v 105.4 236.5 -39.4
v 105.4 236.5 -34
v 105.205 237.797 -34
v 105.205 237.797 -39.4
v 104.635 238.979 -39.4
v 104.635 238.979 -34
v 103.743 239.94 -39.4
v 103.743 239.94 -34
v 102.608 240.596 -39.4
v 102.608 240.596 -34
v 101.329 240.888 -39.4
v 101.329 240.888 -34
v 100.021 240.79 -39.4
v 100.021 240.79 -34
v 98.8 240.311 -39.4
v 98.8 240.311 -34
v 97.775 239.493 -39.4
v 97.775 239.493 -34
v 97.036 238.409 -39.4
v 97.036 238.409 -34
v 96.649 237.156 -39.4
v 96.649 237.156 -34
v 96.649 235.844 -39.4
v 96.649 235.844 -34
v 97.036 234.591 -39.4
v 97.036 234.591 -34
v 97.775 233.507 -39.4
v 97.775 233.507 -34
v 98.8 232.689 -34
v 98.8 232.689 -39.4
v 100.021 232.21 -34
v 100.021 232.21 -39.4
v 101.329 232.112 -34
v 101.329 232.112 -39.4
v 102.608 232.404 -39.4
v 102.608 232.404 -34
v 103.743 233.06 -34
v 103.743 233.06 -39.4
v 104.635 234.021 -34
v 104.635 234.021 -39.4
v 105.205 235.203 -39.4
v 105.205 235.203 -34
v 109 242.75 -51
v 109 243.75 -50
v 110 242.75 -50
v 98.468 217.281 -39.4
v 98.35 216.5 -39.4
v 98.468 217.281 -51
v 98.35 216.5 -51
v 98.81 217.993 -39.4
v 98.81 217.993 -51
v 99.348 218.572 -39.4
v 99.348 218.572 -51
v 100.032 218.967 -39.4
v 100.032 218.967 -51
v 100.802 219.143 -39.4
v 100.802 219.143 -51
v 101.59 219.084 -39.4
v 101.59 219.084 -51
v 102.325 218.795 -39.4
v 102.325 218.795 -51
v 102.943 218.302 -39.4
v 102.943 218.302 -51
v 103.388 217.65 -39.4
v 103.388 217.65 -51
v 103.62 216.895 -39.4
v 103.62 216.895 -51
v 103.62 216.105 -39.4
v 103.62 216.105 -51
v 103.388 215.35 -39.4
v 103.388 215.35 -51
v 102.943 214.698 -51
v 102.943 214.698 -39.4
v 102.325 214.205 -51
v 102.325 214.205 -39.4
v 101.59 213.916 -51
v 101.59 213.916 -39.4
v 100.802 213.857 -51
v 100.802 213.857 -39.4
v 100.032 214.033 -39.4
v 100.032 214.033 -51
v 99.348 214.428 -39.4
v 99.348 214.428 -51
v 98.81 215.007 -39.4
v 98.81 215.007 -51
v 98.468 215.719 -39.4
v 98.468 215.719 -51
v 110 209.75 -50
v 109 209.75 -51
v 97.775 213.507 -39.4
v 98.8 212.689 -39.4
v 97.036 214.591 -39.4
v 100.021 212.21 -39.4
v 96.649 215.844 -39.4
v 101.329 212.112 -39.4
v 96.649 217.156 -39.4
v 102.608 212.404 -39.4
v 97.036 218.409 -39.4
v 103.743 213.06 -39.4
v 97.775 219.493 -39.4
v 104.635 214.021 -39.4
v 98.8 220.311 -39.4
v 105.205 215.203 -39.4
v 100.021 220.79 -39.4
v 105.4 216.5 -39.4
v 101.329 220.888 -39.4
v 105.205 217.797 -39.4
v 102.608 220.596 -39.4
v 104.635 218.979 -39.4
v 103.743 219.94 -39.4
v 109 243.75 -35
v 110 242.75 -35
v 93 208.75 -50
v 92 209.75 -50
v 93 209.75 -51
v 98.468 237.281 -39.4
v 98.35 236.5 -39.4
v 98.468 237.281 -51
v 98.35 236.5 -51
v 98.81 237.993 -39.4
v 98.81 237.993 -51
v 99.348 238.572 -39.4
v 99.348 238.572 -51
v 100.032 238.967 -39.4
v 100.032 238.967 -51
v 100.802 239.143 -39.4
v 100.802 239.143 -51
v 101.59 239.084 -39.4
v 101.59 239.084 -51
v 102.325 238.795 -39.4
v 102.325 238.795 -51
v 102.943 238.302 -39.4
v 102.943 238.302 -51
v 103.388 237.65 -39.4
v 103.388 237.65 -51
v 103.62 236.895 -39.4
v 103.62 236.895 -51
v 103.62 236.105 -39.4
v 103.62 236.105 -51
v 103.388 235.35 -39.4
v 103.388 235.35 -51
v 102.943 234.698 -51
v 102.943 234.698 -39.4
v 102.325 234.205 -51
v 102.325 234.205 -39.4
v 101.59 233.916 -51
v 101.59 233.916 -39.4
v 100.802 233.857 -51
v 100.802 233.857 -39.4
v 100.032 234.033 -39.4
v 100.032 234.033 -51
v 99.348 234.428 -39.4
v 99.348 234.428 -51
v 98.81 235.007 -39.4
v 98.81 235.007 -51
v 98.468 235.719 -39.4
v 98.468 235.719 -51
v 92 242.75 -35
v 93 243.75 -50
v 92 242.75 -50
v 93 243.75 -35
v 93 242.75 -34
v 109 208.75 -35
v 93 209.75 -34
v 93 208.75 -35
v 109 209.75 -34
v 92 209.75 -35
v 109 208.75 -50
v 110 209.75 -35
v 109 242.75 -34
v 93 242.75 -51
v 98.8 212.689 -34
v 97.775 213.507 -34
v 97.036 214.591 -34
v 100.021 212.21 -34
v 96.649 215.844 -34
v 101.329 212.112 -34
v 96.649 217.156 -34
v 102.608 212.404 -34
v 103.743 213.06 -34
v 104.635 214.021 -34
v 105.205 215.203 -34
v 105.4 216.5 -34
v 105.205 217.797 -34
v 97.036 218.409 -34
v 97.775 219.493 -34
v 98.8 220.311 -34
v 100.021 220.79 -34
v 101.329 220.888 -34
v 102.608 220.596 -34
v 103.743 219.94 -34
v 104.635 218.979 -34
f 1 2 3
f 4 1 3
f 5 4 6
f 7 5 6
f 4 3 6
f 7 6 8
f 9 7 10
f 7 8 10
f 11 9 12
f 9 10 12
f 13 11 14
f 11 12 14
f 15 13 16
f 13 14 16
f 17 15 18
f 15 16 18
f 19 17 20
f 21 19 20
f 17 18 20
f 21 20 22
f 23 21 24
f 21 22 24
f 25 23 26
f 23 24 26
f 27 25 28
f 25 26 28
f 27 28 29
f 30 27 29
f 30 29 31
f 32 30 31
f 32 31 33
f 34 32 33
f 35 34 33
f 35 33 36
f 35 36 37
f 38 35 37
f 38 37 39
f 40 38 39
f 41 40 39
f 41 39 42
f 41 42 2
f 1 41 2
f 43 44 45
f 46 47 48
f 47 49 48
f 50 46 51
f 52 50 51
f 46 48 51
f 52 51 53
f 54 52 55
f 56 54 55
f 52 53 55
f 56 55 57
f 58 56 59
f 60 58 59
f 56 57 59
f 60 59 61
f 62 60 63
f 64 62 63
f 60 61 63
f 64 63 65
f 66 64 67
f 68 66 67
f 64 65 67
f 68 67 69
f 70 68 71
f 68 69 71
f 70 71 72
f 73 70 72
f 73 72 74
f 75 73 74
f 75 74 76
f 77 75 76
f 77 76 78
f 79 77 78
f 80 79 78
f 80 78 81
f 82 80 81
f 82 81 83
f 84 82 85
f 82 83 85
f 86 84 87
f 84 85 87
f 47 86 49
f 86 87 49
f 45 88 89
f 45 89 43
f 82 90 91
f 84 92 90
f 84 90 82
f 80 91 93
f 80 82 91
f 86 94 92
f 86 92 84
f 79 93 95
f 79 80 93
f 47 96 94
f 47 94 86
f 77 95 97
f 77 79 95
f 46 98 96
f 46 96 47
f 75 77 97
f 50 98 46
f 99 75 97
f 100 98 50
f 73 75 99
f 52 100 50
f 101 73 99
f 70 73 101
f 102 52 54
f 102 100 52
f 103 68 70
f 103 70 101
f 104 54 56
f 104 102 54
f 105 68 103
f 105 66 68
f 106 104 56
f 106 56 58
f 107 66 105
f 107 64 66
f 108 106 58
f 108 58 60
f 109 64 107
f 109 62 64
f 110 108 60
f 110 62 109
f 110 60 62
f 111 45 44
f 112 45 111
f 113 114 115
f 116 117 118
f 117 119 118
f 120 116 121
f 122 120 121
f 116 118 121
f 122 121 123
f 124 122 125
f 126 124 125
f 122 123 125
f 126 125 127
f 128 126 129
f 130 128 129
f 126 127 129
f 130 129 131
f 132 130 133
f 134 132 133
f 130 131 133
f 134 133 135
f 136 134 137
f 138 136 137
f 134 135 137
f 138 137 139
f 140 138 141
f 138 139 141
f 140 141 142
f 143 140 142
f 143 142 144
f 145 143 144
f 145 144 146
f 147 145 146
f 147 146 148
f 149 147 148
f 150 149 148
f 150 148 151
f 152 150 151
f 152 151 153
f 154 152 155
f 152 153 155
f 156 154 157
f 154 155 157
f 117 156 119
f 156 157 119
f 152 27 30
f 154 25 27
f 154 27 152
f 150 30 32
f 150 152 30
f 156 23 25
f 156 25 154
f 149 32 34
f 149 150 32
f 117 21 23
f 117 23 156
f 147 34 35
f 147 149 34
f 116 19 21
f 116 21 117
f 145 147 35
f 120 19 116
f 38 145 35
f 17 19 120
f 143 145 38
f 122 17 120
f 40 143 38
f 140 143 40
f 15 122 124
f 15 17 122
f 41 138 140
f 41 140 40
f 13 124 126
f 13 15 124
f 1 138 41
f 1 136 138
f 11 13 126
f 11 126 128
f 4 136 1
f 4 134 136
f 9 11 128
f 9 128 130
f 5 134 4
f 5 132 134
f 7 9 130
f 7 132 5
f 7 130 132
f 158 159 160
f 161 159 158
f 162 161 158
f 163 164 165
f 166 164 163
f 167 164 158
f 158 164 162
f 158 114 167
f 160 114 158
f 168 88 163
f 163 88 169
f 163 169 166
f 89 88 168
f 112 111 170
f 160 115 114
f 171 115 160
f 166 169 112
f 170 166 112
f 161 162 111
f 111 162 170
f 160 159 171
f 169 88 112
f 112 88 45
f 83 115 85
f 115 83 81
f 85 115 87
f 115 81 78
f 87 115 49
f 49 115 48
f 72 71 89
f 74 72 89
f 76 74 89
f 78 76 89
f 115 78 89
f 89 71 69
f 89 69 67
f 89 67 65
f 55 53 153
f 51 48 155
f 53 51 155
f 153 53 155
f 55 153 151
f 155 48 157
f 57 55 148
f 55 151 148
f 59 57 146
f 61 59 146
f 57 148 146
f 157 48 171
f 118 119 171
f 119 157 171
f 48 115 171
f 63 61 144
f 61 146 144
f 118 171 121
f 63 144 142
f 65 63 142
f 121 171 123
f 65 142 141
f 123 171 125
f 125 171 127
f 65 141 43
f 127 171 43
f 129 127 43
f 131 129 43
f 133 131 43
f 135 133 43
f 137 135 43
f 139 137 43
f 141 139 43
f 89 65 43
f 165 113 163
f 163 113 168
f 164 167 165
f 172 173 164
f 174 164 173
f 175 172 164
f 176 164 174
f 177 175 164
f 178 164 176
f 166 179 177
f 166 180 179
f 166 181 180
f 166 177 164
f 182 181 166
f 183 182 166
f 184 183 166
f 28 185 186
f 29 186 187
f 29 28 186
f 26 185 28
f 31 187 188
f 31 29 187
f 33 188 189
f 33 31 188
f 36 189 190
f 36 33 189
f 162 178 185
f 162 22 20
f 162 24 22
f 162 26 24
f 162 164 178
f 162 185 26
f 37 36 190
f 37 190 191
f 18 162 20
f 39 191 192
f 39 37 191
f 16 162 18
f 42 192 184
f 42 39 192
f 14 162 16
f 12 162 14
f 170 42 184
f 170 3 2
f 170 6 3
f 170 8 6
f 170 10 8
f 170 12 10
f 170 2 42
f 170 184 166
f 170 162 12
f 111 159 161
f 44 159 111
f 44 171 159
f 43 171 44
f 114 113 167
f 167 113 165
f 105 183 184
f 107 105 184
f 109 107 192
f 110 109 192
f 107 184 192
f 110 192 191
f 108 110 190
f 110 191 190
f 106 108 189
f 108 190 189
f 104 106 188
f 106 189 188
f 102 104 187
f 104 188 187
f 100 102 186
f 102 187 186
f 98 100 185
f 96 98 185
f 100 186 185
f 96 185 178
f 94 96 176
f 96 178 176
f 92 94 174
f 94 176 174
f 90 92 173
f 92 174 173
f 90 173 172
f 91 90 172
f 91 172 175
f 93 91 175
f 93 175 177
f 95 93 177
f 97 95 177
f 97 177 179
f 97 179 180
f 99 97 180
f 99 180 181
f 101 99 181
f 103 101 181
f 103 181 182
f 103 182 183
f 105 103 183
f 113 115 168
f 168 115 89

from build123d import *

# Parameters (mm, degrees)
SKETCH076_W         = 18
SKETCH076_H         = 35
PAD038_DEPTH        = 17
HOLE008_D           = 5.3
HOLE008_DEPTH       = 25
HOLE008_CBORE_D     = 8.8
HOLE008_CBORE_DEPTH = 5.4
CHAMFER021_SIZE     = 1


with BuildPart() as part:
    # Sketch076 → Pad038 (new body)
    with BuildSketch(Plane.XY.offset(-51)):
        with Locations((101, 222.5)):
            Rectangle(SKETCH076_W, SKETCH076_H)
    extrude(amount=PAD038_DEPTH)

    # Hole008
    with Locations(Plane.XY.offset(-34)):
        with Locations((101, 232.75), (101, 212.75)):
            CounterBoreHole(HOLE008_D / 2, HOLE008_CBORE_D / 2, HOLE008_CBORE_DEPTH, depth=HOLE008_DEPTH)

    # Chamfer021
    chamfer021_edges = [part.edges().sort_by_distance(p)[0] for p in [
        (92, 240, -42.5),
        (110, 240, -42.5),
        (101, 240, -51),
        (101, 240, -34),
        (110, 205, -42.5),
        (110, 222.5, -51),
        (110, 222.5, -34),
        (92, 205, -42.5),
        (92, 222.5, -51),
        (92, 222.5, -34),
        (101, 205, -51),
        (101, 205, -34),
    ]]
    chamfer(chamfer021_edges, length=CHAMFER021_SIZE)


with BuildPart() as part_1:
    # Body001010 placement: moved
    add(part.part.moved(Location((0, 3.75, 0))))


solid = part_1.part
